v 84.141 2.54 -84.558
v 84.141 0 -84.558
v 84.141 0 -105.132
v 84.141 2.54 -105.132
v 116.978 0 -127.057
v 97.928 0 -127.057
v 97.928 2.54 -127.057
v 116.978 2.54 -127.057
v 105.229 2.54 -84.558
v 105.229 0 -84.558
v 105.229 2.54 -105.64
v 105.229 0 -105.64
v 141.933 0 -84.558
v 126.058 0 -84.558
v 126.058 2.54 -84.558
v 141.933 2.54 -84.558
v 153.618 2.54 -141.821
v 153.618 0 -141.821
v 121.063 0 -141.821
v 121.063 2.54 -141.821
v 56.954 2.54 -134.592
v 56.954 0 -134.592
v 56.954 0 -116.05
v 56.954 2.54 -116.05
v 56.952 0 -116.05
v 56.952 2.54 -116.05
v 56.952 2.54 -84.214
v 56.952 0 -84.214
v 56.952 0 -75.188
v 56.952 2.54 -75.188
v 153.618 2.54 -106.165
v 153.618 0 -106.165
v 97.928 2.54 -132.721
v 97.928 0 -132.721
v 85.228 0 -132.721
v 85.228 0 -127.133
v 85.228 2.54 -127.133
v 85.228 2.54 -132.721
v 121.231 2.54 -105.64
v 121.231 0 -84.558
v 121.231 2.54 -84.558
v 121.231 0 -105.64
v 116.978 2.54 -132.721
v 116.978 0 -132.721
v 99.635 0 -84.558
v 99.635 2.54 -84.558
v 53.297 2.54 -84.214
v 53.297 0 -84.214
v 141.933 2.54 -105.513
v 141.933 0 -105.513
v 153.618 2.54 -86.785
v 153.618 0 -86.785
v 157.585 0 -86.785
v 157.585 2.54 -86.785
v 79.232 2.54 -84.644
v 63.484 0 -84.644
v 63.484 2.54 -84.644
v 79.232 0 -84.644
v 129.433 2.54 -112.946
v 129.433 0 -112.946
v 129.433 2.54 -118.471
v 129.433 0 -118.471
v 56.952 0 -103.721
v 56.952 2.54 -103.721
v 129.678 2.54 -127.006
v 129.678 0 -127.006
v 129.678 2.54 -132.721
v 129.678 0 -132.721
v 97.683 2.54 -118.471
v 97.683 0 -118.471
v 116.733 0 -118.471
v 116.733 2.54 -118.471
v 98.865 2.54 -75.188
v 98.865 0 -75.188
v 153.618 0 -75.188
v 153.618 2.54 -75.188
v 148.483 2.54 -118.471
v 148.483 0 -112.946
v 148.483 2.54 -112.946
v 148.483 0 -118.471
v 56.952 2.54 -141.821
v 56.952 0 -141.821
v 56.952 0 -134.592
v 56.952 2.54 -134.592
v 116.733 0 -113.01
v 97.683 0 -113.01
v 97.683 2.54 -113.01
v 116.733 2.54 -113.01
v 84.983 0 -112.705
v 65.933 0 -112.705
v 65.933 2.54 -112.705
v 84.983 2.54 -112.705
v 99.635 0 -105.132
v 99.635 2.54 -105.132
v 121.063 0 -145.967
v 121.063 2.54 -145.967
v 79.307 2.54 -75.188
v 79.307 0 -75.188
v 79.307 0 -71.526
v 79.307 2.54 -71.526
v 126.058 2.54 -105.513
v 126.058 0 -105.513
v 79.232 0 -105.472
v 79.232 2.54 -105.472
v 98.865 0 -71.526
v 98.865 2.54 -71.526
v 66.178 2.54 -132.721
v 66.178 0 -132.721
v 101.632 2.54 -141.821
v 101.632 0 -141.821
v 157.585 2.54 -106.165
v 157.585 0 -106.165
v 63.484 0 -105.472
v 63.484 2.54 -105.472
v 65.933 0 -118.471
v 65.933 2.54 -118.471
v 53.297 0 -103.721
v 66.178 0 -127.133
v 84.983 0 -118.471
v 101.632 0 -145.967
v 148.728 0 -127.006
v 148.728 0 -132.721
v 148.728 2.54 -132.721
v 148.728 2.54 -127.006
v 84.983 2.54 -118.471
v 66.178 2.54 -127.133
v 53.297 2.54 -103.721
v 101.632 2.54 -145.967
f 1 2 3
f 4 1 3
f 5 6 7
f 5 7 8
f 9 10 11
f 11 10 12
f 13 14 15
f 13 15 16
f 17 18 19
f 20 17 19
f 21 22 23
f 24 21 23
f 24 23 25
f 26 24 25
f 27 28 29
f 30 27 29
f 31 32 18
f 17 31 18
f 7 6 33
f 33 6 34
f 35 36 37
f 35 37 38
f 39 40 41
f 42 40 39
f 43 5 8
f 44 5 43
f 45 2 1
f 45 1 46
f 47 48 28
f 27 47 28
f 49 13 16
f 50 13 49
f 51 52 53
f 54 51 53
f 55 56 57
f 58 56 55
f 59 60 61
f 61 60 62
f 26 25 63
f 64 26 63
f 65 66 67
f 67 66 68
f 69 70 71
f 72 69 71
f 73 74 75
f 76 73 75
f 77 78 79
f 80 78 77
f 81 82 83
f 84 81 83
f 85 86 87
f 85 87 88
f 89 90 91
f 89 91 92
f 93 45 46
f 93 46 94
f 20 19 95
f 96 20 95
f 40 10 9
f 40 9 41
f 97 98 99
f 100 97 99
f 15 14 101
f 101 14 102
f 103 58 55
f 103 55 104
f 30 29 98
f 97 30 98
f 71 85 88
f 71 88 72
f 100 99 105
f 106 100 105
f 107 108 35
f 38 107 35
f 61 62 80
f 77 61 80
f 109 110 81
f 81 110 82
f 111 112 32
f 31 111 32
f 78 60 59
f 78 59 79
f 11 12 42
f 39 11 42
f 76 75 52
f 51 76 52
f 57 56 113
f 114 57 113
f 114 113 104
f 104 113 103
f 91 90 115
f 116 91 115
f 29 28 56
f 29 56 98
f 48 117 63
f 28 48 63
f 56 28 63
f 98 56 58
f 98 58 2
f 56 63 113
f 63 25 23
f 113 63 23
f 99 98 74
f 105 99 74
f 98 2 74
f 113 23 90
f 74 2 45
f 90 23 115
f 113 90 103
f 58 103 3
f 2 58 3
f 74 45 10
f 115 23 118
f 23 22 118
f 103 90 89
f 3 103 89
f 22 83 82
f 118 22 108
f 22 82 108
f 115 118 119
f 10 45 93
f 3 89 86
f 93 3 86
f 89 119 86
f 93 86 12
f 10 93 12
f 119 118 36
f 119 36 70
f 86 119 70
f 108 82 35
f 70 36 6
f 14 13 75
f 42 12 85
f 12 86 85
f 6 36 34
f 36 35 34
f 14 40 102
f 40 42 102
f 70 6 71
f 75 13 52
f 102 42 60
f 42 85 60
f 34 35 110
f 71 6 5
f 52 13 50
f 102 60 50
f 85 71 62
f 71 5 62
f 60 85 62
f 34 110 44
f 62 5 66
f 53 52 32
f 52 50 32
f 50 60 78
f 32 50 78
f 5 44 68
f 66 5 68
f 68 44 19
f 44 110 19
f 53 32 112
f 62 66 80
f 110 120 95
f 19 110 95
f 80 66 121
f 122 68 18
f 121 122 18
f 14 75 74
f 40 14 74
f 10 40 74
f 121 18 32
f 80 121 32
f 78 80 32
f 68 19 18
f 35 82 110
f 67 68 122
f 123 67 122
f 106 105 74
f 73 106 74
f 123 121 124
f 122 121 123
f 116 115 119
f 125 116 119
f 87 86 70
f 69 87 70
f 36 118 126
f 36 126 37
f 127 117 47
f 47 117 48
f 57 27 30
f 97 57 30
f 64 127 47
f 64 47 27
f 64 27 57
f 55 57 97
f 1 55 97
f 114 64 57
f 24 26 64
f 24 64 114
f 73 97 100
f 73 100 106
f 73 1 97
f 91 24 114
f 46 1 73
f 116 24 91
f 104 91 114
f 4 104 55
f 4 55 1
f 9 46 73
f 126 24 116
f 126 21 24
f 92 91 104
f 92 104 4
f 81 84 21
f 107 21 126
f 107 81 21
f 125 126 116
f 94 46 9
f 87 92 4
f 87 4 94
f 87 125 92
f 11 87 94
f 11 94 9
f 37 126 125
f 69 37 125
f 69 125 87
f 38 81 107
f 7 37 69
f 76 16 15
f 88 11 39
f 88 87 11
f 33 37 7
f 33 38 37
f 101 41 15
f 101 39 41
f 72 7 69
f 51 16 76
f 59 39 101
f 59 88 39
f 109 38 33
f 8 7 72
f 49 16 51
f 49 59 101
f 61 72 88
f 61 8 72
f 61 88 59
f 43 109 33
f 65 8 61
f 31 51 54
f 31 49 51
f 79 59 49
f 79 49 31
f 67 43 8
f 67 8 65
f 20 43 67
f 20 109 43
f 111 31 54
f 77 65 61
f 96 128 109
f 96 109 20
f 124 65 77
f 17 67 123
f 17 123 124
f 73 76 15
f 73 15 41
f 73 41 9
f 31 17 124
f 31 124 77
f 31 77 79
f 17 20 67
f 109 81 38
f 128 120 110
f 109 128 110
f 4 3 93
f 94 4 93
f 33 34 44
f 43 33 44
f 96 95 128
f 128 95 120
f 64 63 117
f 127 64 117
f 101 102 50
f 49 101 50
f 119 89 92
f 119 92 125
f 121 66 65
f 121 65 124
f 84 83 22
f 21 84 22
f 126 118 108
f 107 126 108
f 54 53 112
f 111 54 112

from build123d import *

# Parameters (mm, degrees)
SKETCH1_W           = 19.05
SKETCH1_H           = 5.7658
SKETCH1_H_2         = 5.5245
SKETCH1_H_3         = 5.461
SKETCH1_W_2         = 15.748
SKETCH1_H_4         = 20.828
SKETCH1_W_3         = 15.494
SKETCH1_H_5         = 20.574
SKETCH1_W_4         = 16.002
SKETCH1_H_6         = 21.082
SKETCH1_W_5         = 15.875
SKETCH1_H_7         = 20.955
SKETCH1_H_8         = 5.588
SKETCH1_H_9         = 5.715
SKETCH1_H_10        = 5.6642
BOSS_EXTRUDE1_DEPTH = 2.54


with BuildPart() as part:
    # Sketch1 → Boss-Extrude1 (new body)
    with BuildSketch(Plane(origin=(0, 0, 0), x_dir=(1, 0, 0), z_dir=(0, 1, 0))):
        Polygon((56.951560312, 84.213691439), (56.951560312, 75.188096428), (79.306647339, 75.188096428), (79.306647339, 71.525938437), (98.864647339, 71.525938437), (98.864647339, 75.188096428), (153.617936559, 75.188096428), (153.617936559, 86.784930064), (157.585274382, 86.784930064), (157.585274382, 106.165130064), (153.617936559, 106.165130064), (153.617936559, 141.820891439), (121.062786422, 141.820891439), (121.062786422, 145.967343453), (101.631786422, 145.967343453), (101.631786422, 141.820891439), (56.951560312, 141.820891439), (56.951560312, 134.591745655), (56.953910325, 134.591745655), (56.953910325, 116.049745655), (56.951560312, 116.049745655), (56.951560312, 103.720891439), (53.296575292, 103.720891439), (53.296575292, 84.213691439), align=None)
        with Locations((75.457604332, 115.587849021)):
            Rectangle(SKETCH1_W, SKETCH1_H, mode=Mode.SUBTRACT)
        with Locations((138.957604332, 115.708499021)):
            Rectangle(SKETCH1_W, SKETCH1_H_2, mode=Mode.SUBTRACT)
        with Locations((107.207604332, 115.740249021)):
            Rectangle(SKETCH1_W, SKETCH1_H_3, mode=Mode.SUBTRACT)
        with Locations((71.358442331, 95.058042907)):
            Rectangle(SKETCH1_W_2, SKETCH1_H_4, mode=Mode.SUBTRACT)
        with Locations((91.888312798, 94.844972613)):
            Rectangle(SKETCH1_W_3, SKETCH1_H_5, mode=Mode.SUBTRACT)
        with Locations((113.229534733, 95.098972613)):
            Rectangle(SKETCH1_W_4, SKETCH1_H_6, mode=Mode.SUBTRACT)
        with Locations((133.995045787, 95.035472613)):
            Rectangle(SKETCH1_W_5, SKETCH1_H_7, mode=Mode.SUBTRACT)
        with Locations((75.70300706, 129.926754737)):
            Rectangle(SKETCH1_W, SKETCH1_H_8, mode=Mode.SUBTRACT)
        with Locations((139.20300706, 129.863254737)):
            Rectangle(SKETCH1_W, SKETCH1_H_9, mode=Mode.SUBTRACT)
        with Locations((107.45300706, 129.888654737)):
            Rectangle(SKETCH1_W, SKETCH1_H_10, mode=Mode.SUBTRACT)
    extrude(amount=BOSS_EXTRUDE1_DEPTH)


solid = part.part
